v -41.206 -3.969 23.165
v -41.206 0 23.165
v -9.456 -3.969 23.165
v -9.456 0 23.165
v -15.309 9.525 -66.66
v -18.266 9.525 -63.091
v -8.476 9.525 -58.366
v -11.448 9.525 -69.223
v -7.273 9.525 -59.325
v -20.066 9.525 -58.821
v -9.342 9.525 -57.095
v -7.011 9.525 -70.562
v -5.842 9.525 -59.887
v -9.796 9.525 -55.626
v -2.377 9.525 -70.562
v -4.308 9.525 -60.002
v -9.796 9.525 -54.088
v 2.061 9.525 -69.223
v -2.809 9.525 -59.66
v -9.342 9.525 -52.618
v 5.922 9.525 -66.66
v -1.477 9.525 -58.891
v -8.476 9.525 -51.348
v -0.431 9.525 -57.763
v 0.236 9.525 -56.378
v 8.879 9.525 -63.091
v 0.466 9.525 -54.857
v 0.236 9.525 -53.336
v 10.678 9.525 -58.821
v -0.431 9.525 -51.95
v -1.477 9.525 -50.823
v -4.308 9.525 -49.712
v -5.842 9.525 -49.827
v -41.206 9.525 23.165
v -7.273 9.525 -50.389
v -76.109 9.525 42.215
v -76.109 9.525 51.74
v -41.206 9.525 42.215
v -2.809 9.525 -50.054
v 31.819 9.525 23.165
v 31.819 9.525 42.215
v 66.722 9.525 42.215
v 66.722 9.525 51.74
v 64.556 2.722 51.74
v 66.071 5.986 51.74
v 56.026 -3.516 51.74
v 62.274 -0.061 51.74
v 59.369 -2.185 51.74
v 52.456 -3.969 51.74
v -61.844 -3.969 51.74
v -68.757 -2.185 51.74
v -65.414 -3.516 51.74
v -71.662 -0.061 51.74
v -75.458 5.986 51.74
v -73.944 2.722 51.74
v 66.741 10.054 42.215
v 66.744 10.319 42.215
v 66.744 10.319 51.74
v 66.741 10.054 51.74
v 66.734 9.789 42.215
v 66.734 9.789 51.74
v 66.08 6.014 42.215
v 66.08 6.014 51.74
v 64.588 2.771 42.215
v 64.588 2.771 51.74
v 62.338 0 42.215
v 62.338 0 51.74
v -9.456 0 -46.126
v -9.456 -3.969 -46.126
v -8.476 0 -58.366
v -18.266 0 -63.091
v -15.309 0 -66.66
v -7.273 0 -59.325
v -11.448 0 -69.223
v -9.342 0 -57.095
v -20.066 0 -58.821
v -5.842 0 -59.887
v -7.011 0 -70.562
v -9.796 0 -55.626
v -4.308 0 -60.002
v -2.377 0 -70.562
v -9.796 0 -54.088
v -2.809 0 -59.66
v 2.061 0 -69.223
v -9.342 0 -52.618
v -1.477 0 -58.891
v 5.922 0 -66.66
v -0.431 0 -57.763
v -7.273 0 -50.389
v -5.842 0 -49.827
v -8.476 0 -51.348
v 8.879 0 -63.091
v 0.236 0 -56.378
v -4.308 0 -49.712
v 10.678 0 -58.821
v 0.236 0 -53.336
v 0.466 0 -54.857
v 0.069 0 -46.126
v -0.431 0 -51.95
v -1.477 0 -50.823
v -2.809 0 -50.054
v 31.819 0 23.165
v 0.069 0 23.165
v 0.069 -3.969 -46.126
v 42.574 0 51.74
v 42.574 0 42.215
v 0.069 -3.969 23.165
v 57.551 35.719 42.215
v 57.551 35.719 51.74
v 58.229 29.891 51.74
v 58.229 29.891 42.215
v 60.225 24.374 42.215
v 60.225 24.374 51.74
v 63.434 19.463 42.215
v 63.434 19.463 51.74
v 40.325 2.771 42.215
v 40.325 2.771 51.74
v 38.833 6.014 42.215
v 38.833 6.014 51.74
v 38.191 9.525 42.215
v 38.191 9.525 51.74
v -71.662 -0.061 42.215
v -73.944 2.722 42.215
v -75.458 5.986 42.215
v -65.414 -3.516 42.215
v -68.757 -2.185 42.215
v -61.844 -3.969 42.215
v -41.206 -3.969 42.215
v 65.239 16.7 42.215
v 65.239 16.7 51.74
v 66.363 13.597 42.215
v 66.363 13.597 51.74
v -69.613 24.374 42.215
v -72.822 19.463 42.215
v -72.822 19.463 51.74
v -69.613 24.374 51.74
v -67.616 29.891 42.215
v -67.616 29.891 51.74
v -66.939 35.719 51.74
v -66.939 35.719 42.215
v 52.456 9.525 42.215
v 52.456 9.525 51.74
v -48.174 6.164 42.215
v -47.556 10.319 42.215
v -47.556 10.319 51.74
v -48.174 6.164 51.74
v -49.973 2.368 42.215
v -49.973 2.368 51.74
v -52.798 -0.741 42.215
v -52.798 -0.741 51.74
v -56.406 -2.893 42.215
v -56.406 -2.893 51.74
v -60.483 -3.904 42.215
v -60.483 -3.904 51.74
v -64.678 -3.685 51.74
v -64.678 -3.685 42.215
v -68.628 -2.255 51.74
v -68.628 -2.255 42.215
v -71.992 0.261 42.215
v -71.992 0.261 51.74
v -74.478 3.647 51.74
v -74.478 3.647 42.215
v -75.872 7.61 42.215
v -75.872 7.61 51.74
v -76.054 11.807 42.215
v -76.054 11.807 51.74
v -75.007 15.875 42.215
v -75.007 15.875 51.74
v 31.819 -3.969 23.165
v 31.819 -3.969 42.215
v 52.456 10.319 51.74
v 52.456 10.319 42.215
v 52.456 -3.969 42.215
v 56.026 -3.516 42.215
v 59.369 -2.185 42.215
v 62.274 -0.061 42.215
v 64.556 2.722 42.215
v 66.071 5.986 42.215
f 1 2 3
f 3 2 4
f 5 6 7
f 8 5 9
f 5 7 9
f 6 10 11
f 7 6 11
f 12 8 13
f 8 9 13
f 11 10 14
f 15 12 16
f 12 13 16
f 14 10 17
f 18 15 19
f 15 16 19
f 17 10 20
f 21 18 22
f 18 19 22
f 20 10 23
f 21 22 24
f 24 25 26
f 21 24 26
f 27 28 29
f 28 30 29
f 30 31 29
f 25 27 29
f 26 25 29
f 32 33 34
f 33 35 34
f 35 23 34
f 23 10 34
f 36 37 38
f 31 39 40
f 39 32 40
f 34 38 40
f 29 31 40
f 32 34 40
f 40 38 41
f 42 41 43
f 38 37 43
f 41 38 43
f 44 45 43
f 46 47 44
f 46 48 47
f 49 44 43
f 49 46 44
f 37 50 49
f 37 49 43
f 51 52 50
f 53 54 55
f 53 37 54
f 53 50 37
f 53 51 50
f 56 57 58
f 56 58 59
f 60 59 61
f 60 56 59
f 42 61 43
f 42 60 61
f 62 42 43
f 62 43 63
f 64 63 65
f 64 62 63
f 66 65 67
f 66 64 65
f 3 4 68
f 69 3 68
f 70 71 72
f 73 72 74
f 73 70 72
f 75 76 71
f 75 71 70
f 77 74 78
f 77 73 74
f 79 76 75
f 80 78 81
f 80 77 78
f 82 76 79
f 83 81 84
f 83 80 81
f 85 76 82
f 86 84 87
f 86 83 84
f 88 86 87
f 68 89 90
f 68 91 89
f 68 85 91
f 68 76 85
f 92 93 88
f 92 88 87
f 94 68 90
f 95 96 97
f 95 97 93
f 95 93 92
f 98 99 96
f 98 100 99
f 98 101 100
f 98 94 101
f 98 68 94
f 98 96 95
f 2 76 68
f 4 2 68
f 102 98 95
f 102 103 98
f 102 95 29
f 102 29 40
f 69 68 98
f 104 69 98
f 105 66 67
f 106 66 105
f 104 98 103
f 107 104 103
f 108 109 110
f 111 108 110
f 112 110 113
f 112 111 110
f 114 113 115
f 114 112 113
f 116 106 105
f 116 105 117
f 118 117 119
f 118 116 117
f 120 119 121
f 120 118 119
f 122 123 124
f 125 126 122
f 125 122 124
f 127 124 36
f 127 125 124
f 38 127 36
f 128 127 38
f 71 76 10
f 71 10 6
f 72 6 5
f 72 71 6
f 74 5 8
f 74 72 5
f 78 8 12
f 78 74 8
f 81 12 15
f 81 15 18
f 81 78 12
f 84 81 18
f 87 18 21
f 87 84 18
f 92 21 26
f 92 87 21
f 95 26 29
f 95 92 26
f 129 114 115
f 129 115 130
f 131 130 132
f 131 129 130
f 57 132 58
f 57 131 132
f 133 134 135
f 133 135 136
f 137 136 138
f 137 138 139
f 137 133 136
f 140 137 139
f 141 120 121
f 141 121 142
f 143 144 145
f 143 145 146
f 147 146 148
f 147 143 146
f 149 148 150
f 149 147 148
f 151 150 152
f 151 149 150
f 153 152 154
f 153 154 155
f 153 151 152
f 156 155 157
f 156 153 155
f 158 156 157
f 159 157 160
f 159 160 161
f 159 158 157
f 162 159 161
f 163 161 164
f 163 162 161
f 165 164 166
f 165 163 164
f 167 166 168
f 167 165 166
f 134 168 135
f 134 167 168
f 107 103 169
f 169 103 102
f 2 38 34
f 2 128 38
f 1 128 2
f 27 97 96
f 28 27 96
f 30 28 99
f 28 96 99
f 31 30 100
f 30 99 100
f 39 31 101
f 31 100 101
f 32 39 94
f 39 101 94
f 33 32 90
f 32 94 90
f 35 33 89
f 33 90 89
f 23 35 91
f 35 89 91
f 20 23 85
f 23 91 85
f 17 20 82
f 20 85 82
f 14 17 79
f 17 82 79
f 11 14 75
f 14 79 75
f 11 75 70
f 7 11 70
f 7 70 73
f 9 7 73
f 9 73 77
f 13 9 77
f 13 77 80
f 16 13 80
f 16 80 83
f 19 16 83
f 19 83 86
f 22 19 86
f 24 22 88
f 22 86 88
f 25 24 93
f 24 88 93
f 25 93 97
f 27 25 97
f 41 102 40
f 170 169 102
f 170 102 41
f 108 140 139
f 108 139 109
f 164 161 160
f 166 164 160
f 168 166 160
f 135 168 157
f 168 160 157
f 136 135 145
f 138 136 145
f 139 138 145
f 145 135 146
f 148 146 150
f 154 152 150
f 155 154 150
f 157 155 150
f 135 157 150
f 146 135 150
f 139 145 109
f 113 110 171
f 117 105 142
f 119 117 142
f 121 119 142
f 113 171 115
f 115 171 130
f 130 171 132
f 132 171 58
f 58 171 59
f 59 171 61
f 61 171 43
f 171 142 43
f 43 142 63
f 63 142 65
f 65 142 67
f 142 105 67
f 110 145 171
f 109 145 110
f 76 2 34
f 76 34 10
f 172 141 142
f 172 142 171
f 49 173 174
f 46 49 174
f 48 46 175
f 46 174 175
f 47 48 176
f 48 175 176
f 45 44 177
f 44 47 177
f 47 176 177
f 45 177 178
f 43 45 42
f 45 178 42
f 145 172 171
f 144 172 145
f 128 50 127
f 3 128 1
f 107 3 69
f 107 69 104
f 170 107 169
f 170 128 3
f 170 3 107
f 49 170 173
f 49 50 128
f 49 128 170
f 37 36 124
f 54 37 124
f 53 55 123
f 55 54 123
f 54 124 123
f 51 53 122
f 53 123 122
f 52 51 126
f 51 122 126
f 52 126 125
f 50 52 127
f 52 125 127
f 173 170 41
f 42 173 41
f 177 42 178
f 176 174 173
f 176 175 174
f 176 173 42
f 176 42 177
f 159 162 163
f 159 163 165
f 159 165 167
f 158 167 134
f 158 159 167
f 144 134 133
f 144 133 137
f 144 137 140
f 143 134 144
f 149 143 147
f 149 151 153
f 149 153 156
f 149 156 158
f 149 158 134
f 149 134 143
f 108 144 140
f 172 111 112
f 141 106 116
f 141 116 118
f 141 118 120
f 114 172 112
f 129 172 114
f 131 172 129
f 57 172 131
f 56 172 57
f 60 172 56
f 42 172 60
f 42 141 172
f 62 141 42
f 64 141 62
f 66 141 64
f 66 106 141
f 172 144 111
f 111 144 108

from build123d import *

# Parameters (mm, degrees)
F1_DEPTH = 3.96875
F0_R     = 5.159375
F2_DEPTH = 9.525
F4_DEPTH = 9.525
F8_DEPTH = 9.526


with BuildPart() as f1:
    # F0 (on Front) → F1 (new body)
    with BuildSketch(Plane.XZ):
        Polygon((-41.206286113, 42.2151100993), (-41.206286113, 23.1651100993), (-9.456286113, 23.1651100993), (-9.456286113, -46.1256168256), (0.068713887, -46.1256168256), (0.068713887, 23.1651100993), (31.818713887, 23.1651100993), (31.818713887, 42.2151100993), (52.456213887, 42.2151100993), (66.743713887, 42.2151100993), (66.743713887, 51.7401100993), (-76.131286113, 51.7401100993), (-76.131286113, 42.2151100993), (-61.843786113, 42.2151100993), align=None)
    extrude(amount=F1_DEPTH)


with BuildPart() as f2:
    # F0 (on Front) → F2 (new body)
    with BuildSketch(Plane.XZ):
        with BuildLine():
            Line((-9.456286113, 23.1651100993), (-41.206286113, 23.1651100993))
            Line((-41.206286113, 23.1651100993), (-20.0659731361, -58.8206391609))
            ThreePointArc((-20.0659731361, -58.8206391609), (-4.693786113, -70.7318668256), (10.6784009101, -58.8206391609))
            Line((10.6784009101, -58.8206391609), (31.818713887, 23.1651100993))
            Line((31.818713887, 23.1651100993), (0.068713887, 23.1651100993))
            Line((0.068713887, 23.1651100993), (0.068713887, -46.1256168256))
            Line((0.068713887, -46.1256168256), (-9.456286113, -46.1256168256))
            Line((-9.456286113, -46.1256168256), (-9.456286113, 23.1651100993))
        make_face()
        with Locations((-4.693786113, -54.8568668256)):
            Circle(F0_R, mode=Mode.SUBTRACT)
        Polygon((-41.206286113, 42.2151100993), (-41.206286113, 23.1651100993), (-9.456286113, 23.1651100993), (-9.456286113, -46.1256168256), (0.068713887, -46.1256168256), (0.068713887, 23.1651100993), (31.818713887, 23.1651100993), (31.818713887, 42.2151100993), (52.456213887, 42.2151100993), (66.743713887, 42.2151100993), (66.743713887, 51.7401100993), (-76.131286113, 51.7401100993), (-76.131286113, 42.2151100993), (-61.843786113, 42.2151100993), align=None)
    extrude(amount=-F2_DEPTH)


with BuildPart() as f4:
    # F3 (on face) → F4 (new body)
    with BuildSketch(Plane(origin=(0, 0, 42.2151100993), x_dir=(1, 0, 0), z_dir=(0, 0, -1))):
        with BuildLine():
            ThreePointArc((-61.843786113, -24.60625), (-51.7409979768, -20.4215381362), (-47.556286113, -10.31875))
            Line((-47.556286113, -10.31875), (-61.843786113, -10.31875))
            Line((-61.843786113, -10.31875), (-61.843786113, -24.60625))
        make_face()
        with BuildLine():
            Line((-66.9386652938, -35.71875), (-61.843786113, -35.71875))
            Line((-61.843786113, -35.71875), (-61.843786113, -24.60625))
            ThreePointArc((-61.843786113, -24.60625), (-67.9054589947, -23.2566315161), (-72.8219426181, -19.46275))
            ThreePointArc((-72.8219426181, -19.46275), (-68.4547297307, -27.0748144369), (-66.9386652938, -35.71875))
        make_face()
        with BuildLine():
            Line((-61.843786113, -35.71875), (-4.693786113, -35.71875))
            Line((-4.693786113, -35.71875), (-4.693786113, -10.31875))
            Line((-4.693786113, -10.31875), (-47.556286113, -10.31875))
            ThreePointArc((-47.556286113, -10.31875), (-51.7409979768, -20.4215381362), (-61.843786113, -24.60625))
            Line((-61.843786113, -24.60625), (-61.843786113, -35.71875))
        make_face()
        with BuildLine():
            Line((52.456213887, -35.71875), (52.456213887, -24.60625))
            ThreePointArc((52.456213887, -24.60625), (42.3534257508, -20.4215381362), (38.168713887, -10.31875))
            Line((38.168713887, -10.31875), (-4.693786113, -10.31875))
            Line((-4.693786113, -10.31875), (-4.693786113, -35.71875))
            Line((-4.693786113, -35.71875), (52.456213887, -35.71875))
        make_face()
        with BuildLine():
            ThreePointArc((57.5510930678, -35.71875), (59.0671575047, -27.0748144369), (63.4343703921, -19.46275))
            ThreePointArc((63.4343703921, -19.46275), (58.5178867687, -23.2566315161), (52.456213887, -24.60625))
            Line((52.456213887, -24.60625), (52.456213887, -35.71875))
            Line((52.456213887, -35.71875), (57.5510930678, -35.71875))
        make_face()
        with BuildLine():
            Line((-61.843786113, -10.31875), (-47.556286113, -10.31875))
            ThreePointArc((-47.556286113, -10.31875), (-66.7059998672, 3.1159637542), (-72.8219426181, -19.46275))
            ThreePointArc((-72.8219426181, -19.46275), (-67.9054589947, -23.2566315161), (-61.843786113, -24.60625))
            Line((-61.843786113, -24.60625), (-61.843786113, -10.31875))
        make_face()
        with BuildLine():
            ThreePointArc((52.456213887, -24.60625), (58.5178867687, -23.2566315161), (63.4343703921, -19.46275))
            ThreePointArc((63.4343703921, -19.46275), (65.8909276412, -15.1809637542), (66.743713887, -10.31875))
            ThreePointArc((66.743713887, -10.31875), (66.7381964091, -9.9217216775), (66.7216482368, -9.525))
            Line((66.7216482368, -9.525), (52.456213887, -9.525))
            Line((52.456213887, -9.525), (52.456213887, -10.31875))
            Line((52.456213887, -10.31875), (52.456213887, -24.60625))
        make_face()
        with BuildLine():
            Line((52.456213887, -9.525), (66.7216482368, -9.525))
            ThreePointArc((66.7216482368, -9.525), (65.4353261174, -4.3458694588), (62.3383216929, 0))
            Line((62.3383216929, 0), (42.5741060811, 0))
            ThreePointArc((42.5741060811, 0), (39.4771016566, -4.3458694588), (38.1907795372, -9.525))
            Line((38.1907795372, -9.525), (52.456213887, -9.525))
        make_face()
        with BuildLine():
            ThreePointArc((38.168713887, -10.31875), (42.3534257508, -20.4215381362), (52.456213887, -24.60625))
            Line((52.456213887, -24.60625), (52.456213887, -10.31875))
            Line((52.456213887, -10.31875), (38.168713887, -10.31875))
        make_face()
    extrude(amount=-F4_DEPTH)


with BuildPart() as f1_1:
    add(f1.part)

    # F5: union F2
    add(f2.part)

    # F7 (on face) + F6 (on face) → F8 (cut, through all)
    with BuildSketch(Plane(origin=(0, 0, 42.2151100993), x_dir=(1, 0, 0), z_dir=(0, 0, -1))):
        with BuildLine():
            Line((-76.131286113, -2.778125), (-76.131286113, -9.525))
            Line((-76.131286113, -9.525), (-76.1092204628, -9.525))
            ThreePointArc((-76.1092204628, -9.525), (-71.661931384, 0.0608781093), (-61.843786113, 3.96875))
            Line((-61.843786113, 3.96875), (-69.3655908108, 3.96875))
            Line((-69.3655908108, 3.96875), (-76.131286113, 3.96875))
            Line((-76.131286113, 3.96875), (-76.131286113, -2.778125))
        make_face()
    with BuildSketch(Plane(origin=(0, 0, 42.2151100993), x_dir=(1, 0, 0), z_dir=(0, 0, -1))):
        with BuildLine():
            Line((58.8548928499, 3.96875), (52.456213887, 3.96875))
            ThreePointArc((52.456213887, 3.96875), (62.274359158, 0.0608781093), (66.7216482368, -9.525))
            Line((66.7216482368, -9.525), (66.743713887, -9.525))
            Line((66.743713887, -9.525), (66.743713887, -2.778125))
            Line((66.743713887, -2.778125), (66.743713887, 3.96875))
            Line((66.743713887, 3.96875), (58.8548928499, 3.96875))
        make_face()
    extrude(amount=-F8_DEPTH, mode=Mode.SUBTRACT)


solid = Compound([f4.part, f1_1.part])
